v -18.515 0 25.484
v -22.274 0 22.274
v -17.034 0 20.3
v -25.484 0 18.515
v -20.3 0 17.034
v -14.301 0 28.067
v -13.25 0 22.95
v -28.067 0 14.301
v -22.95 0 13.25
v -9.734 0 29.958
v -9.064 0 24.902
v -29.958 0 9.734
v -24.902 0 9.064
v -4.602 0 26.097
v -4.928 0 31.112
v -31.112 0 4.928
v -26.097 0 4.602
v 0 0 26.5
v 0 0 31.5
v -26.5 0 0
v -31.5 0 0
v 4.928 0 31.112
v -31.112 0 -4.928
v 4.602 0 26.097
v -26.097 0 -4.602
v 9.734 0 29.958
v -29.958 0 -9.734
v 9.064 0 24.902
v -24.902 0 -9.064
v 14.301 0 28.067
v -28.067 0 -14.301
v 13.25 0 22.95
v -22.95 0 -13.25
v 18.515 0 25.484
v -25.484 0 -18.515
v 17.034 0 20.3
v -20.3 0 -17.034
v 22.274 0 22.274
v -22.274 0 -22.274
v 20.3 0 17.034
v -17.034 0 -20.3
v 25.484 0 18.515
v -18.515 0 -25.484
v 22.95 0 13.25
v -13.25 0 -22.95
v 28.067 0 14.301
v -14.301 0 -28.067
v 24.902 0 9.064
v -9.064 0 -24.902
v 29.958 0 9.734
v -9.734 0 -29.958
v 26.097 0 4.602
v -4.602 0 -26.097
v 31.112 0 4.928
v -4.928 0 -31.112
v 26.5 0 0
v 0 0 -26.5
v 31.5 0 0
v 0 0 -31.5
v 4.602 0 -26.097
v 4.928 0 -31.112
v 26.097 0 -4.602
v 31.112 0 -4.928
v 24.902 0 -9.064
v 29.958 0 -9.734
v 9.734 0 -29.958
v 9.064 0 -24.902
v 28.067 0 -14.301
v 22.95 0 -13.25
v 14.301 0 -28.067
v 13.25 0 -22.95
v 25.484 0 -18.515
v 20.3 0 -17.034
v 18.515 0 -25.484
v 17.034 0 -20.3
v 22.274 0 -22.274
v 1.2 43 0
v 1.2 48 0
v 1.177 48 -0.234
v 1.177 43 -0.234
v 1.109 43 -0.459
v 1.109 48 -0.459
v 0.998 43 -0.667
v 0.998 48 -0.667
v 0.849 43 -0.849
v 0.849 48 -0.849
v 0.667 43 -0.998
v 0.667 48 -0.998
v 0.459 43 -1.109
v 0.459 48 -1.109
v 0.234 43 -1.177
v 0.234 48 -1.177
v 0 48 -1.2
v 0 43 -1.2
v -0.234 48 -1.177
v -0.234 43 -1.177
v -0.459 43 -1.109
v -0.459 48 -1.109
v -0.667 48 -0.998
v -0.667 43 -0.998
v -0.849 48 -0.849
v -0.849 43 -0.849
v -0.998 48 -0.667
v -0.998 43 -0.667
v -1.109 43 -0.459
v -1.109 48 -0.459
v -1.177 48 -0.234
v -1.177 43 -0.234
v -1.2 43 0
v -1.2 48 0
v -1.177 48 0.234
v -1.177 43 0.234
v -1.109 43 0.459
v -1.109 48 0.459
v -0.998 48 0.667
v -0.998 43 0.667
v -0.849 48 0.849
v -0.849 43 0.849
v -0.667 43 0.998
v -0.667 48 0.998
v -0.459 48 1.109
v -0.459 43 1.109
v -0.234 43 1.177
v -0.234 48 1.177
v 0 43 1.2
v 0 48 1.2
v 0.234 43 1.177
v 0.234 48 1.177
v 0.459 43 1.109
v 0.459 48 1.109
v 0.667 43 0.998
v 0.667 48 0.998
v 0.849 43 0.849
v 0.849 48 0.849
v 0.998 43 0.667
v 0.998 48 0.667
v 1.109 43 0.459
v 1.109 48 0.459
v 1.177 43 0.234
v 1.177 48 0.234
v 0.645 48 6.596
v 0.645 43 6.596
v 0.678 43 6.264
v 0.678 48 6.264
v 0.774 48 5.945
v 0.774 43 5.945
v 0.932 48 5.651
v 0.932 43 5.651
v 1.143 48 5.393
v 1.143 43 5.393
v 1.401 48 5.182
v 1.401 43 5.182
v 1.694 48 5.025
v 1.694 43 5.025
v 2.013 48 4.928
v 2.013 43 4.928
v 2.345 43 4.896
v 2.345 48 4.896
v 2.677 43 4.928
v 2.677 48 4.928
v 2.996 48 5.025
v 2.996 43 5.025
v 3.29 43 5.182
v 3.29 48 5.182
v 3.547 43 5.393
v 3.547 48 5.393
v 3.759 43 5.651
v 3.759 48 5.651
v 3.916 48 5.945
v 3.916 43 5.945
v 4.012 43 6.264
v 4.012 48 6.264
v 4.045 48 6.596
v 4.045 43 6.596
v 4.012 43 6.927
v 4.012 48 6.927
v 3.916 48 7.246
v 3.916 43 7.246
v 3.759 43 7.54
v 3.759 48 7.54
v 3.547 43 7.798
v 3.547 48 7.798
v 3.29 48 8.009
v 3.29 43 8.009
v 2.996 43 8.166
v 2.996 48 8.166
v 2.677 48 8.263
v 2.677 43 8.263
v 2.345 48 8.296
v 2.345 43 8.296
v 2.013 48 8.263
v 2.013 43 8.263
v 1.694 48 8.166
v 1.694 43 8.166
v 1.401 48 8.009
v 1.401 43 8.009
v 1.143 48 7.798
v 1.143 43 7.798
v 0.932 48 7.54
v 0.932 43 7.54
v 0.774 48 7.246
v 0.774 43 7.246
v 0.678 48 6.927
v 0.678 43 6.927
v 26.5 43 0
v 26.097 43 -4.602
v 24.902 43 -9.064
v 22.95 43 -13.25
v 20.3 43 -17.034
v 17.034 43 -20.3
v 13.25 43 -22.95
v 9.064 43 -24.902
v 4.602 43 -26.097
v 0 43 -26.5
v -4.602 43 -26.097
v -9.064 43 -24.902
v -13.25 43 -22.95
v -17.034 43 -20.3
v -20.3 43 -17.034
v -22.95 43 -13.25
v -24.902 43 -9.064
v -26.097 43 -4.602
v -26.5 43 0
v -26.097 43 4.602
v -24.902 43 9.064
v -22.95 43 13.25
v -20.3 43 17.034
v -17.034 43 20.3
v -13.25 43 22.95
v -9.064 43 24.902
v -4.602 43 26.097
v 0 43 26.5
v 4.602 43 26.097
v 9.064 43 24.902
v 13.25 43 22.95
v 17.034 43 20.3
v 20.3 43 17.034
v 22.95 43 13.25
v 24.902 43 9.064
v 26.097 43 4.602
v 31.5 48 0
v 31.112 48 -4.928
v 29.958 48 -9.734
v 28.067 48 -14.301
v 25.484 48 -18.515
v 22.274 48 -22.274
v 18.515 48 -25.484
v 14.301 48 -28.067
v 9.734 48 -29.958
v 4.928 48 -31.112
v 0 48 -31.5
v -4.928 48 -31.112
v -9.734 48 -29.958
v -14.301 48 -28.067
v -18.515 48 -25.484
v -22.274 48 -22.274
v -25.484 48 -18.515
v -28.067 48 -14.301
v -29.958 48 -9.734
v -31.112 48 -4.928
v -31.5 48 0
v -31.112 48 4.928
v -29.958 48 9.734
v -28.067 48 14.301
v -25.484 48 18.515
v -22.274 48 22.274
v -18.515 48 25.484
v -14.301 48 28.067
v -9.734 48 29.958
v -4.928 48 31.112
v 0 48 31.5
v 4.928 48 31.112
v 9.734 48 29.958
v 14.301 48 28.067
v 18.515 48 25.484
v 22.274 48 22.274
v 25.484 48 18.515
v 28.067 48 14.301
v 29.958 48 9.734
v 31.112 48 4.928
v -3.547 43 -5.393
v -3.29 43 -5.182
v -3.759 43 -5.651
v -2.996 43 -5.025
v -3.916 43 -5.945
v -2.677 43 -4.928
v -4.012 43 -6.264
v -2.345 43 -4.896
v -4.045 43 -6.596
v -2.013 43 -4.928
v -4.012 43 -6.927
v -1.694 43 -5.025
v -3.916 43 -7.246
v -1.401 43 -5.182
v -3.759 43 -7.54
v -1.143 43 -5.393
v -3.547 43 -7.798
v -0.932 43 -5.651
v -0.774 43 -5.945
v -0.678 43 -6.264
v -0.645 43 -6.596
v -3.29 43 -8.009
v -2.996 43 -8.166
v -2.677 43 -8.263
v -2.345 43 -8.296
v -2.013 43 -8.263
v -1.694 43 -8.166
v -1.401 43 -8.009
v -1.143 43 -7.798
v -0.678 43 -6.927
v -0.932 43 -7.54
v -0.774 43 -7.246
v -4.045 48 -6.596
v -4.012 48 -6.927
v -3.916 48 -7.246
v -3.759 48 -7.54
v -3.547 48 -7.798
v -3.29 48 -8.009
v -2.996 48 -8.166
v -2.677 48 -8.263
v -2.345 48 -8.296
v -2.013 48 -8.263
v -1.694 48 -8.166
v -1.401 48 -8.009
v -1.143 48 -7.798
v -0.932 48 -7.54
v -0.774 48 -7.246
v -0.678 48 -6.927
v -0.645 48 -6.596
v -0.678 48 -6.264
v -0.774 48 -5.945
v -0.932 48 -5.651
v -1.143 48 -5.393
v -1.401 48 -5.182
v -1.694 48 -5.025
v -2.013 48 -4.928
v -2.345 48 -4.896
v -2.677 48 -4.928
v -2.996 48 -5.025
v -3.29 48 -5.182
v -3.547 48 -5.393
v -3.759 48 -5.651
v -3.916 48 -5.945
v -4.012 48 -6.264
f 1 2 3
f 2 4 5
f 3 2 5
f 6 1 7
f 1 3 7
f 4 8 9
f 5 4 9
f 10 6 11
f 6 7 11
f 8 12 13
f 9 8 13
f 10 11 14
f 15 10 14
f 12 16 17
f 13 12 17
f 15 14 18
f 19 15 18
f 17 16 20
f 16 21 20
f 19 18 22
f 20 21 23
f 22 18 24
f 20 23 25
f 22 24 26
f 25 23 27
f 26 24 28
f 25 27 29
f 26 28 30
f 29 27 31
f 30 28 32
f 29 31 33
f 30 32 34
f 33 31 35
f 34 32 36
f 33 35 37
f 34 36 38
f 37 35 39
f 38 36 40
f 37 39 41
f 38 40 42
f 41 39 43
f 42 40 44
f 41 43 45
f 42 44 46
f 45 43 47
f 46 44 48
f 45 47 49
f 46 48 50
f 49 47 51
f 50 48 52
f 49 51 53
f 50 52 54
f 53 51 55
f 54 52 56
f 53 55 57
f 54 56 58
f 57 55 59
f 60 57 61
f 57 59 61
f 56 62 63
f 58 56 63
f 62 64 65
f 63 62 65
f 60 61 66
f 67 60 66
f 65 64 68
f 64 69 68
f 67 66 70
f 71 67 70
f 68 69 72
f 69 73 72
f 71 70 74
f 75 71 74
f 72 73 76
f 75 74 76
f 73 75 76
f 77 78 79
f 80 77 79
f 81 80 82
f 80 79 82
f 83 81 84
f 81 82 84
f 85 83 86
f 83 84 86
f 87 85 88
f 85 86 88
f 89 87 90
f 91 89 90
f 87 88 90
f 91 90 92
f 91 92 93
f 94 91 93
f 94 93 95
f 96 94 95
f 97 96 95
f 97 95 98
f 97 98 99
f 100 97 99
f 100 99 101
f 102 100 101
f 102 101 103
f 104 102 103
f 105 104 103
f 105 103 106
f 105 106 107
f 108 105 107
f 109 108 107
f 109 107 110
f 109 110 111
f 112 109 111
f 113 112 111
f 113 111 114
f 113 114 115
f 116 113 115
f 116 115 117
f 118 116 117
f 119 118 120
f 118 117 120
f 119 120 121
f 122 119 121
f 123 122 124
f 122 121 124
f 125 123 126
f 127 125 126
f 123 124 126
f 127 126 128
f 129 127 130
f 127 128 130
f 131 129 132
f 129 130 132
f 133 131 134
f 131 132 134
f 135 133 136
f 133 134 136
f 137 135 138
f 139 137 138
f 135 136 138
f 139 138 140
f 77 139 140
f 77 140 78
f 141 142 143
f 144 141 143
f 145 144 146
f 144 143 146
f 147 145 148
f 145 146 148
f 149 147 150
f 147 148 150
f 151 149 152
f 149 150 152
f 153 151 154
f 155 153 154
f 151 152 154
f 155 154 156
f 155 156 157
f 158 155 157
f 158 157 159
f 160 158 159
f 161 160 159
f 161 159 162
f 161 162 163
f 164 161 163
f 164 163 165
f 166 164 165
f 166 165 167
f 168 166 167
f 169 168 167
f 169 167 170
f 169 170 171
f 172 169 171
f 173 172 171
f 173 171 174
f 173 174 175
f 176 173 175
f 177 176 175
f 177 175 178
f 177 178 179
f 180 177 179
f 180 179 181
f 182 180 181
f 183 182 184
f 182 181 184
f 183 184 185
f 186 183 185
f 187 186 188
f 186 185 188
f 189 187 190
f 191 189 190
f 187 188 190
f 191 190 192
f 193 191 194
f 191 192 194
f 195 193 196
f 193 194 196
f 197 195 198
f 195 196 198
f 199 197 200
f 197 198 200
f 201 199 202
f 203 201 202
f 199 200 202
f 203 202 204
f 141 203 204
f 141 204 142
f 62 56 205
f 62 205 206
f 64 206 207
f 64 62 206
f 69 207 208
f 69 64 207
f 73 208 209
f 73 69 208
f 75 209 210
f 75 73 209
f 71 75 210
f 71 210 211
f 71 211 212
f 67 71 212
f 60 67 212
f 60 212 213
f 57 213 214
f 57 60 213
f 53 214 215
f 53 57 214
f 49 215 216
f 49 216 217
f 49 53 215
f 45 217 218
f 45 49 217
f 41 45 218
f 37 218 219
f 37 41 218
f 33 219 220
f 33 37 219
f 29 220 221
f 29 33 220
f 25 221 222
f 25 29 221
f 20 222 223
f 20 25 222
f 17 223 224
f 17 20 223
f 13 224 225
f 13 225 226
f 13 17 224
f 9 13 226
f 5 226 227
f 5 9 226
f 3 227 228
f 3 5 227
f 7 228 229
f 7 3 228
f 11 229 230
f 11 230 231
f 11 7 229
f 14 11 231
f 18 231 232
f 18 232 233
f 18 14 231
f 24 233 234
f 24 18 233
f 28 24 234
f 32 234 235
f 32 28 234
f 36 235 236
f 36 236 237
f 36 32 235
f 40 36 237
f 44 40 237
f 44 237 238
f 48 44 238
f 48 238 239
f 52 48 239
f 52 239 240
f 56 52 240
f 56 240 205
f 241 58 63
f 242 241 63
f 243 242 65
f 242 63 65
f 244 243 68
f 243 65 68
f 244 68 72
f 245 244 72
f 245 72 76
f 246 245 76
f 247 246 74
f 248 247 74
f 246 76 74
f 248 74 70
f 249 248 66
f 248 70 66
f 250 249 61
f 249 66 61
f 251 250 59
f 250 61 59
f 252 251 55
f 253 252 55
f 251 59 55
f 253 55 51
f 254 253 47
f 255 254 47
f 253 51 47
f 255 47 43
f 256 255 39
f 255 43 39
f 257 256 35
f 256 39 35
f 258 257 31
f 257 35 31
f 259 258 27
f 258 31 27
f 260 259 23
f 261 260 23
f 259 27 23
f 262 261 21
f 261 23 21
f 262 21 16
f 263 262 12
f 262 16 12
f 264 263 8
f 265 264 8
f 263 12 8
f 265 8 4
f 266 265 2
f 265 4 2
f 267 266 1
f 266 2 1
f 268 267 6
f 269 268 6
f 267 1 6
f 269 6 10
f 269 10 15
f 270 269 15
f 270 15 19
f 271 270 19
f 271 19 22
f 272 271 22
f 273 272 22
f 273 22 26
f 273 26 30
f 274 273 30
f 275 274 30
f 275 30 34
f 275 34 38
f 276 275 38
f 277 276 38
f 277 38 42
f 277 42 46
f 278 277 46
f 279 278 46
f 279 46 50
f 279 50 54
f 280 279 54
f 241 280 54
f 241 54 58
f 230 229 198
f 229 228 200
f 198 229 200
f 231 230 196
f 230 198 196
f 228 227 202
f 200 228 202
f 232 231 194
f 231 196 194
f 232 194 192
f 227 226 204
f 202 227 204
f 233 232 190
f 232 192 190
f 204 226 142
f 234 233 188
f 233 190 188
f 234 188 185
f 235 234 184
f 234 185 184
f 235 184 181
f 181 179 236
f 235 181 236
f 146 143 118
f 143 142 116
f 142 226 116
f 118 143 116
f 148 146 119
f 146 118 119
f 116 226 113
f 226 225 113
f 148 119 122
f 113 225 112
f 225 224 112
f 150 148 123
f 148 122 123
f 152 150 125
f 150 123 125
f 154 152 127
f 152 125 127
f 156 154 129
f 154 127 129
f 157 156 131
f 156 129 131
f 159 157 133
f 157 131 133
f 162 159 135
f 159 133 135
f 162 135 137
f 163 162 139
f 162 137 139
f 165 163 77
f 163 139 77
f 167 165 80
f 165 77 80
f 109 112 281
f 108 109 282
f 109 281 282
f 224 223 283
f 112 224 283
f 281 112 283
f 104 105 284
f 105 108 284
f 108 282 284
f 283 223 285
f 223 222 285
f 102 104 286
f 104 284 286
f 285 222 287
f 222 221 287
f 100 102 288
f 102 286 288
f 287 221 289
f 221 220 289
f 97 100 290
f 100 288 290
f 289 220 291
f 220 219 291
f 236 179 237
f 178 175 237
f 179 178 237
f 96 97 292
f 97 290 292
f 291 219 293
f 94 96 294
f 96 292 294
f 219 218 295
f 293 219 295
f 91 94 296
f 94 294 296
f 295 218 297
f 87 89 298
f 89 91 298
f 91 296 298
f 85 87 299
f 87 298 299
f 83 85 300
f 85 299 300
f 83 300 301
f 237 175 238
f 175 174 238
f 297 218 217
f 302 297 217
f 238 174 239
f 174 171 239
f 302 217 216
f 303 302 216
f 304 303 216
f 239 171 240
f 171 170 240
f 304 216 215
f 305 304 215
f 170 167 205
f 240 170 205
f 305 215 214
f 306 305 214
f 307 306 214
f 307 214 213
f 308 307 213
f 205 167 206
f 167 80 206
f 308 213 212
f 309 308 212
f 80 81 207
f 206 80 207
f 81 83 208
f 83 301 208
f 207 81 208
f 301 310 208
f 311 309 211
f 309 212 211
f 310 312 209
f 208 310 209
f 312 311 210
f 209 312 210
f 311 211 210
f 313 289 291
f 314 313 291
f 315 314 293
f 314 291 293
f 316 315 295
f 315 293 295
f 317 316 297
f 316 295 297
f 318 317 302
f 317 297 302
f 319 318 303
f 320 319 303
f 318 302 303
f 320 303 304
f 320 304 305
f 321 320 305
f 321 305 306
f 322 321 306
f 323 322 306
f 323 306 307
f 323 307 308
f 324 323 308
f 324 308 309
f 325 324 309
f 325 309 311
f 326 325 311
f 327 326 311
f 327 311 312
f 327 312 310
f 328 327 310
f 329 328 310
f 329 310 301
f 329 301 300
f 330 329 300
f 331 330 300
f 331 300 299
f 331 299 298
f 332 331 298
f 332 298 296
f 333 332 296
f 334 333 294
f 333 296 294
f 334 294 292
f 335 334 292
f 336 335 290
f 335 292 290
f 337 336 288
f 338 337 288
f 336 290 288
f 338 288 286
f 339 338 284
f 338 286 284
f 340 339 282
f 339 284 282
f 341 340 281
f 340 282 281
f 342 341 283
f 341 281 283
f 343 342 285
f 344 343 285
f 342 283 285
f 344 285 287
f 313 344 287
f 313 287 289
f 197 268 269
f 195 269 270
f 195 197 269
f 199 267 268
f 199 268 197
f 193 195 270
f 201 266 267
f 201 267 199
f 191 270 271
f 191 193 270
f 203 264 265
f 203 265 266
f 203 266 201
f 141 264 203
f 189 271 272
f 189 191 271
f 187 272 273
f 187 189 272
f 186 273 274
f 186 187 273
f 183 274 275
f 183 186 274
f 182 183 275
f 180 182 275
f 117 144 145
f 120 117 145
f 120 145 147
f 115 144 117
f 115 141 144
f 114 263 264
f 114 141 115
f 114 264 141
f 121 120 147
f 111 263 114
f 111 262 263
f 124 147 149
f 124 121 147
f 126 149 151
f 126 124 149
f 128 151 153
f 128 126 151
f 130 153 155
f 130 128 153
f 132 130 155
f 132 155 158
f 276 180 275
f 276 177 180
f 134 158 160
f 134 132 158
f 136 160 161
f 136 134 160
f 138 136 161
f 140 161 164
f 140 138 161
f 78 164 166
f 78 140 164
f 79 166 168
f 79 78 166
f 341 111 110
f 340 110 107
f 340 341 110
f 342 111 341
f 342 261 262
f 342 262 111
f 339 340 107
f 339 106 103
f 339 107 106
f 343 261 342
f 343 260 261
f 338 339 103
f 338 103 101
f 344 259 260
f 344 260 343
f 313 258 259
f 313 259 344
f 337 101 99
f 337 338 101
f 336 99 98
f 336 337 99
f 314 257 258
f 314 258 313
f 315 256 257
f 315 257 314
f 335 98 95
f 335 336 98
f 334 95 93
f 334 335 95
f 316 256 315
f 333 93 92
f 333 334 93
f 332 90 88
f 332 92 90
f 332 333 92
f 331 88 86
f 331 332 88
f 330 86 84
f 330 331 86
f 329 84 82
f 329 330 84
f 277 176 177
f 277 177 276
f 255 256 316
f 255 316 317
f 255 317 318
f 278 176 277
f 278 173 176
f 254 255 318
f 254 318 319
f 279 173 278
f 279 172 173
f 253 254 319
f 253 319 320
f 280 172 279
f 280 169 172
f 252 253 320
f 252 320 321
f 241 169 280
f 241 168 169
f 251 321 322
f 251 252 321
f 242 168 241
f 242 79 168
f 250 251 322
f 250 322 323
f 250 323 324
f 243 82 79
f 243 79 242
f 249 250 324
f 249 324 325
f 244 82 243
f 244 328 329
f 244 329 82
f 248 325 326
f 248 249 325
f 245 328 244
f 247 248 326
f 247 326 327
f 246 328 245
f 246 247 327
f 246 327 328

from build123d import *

# Parameters (mm, degrees)
SKETCH4_R                = 31.5
BOSS_EXTRUDE2_DEPTH      = 48
SKETCH3_R                = 26.5
CUT_EXTRUDE1_DEPTH       = 43
M3_CLEARANCE_HOLE1_D     = 3.4
M3_CLEARANCE_HOLE1_DEPTH = 50
M3_CLEARANCE_HOLE1_TIP   = 1.021463052
SKETCH10_R               = 1.2
CUT_EXTRUDE2_DEPTH       = 10


with BuildPart() as part:
    # Sketch4 → Boss-Extrude2 (new body)
    with BuildSketch(Plane(origin=(0, 0, 0), x_dir=(1, 0, 0), z_dir=(0, 1, 0))):
        Circle(SKETCH4_R)
    extrude(amount=BOSS_EXTRUDE2_DEPTH)

    # Sketch3 → Cut-Extrude1 (cut)
    with BuildSketch(Plane(origin=(0, 0, 0), x_dir=(1, 0, 0), z_dir=(0, 1, 0))):
        Circle(SKETCH3_R)
    extrude(amount=CUT_EXTRUDE1_DEPTH, mode=Mode.SUBTRACT)

    # M3 Clearance Hole1
    with Locations(Plane(origin=(0, 48, 0), x_dir=(1, 0, 0), z_dir=(0, 1, 0))):
        with Locations((-2.345047045, 6.595510166), (2.345047045, -6.595510166)):
            Hole(M3_CLEARANCE_HOLE1_D / 2, depth=M3_CLEARANCE_HOLE1_DEPTH)
            with Locations((0, 0, -(M3_CLEARANCE_HOLE1_DEPTH + M3_CLEARANCE_HOLE1_TIP / 2))):  # 118° drill point
                Cone(0, M3_CLEARANCE_HOLE1_D / 2, M3_CLEARANCE_HOLE1_TIP, mode=Mode.SUBTRACT)

    # Sketch10 → Cut-Extrude2 (cut)
    with BuildSketch(Plane(origin=(0, 48, 0), x_dir=(1, 0, 0), z_dir=(0, 1, 0))):
        Circle(SKETCH10_R)
    extrude(amount=-CUT_EXTRUDE2_DEPTH, mode=Mode.SUBTRACT)


solid = part.part
